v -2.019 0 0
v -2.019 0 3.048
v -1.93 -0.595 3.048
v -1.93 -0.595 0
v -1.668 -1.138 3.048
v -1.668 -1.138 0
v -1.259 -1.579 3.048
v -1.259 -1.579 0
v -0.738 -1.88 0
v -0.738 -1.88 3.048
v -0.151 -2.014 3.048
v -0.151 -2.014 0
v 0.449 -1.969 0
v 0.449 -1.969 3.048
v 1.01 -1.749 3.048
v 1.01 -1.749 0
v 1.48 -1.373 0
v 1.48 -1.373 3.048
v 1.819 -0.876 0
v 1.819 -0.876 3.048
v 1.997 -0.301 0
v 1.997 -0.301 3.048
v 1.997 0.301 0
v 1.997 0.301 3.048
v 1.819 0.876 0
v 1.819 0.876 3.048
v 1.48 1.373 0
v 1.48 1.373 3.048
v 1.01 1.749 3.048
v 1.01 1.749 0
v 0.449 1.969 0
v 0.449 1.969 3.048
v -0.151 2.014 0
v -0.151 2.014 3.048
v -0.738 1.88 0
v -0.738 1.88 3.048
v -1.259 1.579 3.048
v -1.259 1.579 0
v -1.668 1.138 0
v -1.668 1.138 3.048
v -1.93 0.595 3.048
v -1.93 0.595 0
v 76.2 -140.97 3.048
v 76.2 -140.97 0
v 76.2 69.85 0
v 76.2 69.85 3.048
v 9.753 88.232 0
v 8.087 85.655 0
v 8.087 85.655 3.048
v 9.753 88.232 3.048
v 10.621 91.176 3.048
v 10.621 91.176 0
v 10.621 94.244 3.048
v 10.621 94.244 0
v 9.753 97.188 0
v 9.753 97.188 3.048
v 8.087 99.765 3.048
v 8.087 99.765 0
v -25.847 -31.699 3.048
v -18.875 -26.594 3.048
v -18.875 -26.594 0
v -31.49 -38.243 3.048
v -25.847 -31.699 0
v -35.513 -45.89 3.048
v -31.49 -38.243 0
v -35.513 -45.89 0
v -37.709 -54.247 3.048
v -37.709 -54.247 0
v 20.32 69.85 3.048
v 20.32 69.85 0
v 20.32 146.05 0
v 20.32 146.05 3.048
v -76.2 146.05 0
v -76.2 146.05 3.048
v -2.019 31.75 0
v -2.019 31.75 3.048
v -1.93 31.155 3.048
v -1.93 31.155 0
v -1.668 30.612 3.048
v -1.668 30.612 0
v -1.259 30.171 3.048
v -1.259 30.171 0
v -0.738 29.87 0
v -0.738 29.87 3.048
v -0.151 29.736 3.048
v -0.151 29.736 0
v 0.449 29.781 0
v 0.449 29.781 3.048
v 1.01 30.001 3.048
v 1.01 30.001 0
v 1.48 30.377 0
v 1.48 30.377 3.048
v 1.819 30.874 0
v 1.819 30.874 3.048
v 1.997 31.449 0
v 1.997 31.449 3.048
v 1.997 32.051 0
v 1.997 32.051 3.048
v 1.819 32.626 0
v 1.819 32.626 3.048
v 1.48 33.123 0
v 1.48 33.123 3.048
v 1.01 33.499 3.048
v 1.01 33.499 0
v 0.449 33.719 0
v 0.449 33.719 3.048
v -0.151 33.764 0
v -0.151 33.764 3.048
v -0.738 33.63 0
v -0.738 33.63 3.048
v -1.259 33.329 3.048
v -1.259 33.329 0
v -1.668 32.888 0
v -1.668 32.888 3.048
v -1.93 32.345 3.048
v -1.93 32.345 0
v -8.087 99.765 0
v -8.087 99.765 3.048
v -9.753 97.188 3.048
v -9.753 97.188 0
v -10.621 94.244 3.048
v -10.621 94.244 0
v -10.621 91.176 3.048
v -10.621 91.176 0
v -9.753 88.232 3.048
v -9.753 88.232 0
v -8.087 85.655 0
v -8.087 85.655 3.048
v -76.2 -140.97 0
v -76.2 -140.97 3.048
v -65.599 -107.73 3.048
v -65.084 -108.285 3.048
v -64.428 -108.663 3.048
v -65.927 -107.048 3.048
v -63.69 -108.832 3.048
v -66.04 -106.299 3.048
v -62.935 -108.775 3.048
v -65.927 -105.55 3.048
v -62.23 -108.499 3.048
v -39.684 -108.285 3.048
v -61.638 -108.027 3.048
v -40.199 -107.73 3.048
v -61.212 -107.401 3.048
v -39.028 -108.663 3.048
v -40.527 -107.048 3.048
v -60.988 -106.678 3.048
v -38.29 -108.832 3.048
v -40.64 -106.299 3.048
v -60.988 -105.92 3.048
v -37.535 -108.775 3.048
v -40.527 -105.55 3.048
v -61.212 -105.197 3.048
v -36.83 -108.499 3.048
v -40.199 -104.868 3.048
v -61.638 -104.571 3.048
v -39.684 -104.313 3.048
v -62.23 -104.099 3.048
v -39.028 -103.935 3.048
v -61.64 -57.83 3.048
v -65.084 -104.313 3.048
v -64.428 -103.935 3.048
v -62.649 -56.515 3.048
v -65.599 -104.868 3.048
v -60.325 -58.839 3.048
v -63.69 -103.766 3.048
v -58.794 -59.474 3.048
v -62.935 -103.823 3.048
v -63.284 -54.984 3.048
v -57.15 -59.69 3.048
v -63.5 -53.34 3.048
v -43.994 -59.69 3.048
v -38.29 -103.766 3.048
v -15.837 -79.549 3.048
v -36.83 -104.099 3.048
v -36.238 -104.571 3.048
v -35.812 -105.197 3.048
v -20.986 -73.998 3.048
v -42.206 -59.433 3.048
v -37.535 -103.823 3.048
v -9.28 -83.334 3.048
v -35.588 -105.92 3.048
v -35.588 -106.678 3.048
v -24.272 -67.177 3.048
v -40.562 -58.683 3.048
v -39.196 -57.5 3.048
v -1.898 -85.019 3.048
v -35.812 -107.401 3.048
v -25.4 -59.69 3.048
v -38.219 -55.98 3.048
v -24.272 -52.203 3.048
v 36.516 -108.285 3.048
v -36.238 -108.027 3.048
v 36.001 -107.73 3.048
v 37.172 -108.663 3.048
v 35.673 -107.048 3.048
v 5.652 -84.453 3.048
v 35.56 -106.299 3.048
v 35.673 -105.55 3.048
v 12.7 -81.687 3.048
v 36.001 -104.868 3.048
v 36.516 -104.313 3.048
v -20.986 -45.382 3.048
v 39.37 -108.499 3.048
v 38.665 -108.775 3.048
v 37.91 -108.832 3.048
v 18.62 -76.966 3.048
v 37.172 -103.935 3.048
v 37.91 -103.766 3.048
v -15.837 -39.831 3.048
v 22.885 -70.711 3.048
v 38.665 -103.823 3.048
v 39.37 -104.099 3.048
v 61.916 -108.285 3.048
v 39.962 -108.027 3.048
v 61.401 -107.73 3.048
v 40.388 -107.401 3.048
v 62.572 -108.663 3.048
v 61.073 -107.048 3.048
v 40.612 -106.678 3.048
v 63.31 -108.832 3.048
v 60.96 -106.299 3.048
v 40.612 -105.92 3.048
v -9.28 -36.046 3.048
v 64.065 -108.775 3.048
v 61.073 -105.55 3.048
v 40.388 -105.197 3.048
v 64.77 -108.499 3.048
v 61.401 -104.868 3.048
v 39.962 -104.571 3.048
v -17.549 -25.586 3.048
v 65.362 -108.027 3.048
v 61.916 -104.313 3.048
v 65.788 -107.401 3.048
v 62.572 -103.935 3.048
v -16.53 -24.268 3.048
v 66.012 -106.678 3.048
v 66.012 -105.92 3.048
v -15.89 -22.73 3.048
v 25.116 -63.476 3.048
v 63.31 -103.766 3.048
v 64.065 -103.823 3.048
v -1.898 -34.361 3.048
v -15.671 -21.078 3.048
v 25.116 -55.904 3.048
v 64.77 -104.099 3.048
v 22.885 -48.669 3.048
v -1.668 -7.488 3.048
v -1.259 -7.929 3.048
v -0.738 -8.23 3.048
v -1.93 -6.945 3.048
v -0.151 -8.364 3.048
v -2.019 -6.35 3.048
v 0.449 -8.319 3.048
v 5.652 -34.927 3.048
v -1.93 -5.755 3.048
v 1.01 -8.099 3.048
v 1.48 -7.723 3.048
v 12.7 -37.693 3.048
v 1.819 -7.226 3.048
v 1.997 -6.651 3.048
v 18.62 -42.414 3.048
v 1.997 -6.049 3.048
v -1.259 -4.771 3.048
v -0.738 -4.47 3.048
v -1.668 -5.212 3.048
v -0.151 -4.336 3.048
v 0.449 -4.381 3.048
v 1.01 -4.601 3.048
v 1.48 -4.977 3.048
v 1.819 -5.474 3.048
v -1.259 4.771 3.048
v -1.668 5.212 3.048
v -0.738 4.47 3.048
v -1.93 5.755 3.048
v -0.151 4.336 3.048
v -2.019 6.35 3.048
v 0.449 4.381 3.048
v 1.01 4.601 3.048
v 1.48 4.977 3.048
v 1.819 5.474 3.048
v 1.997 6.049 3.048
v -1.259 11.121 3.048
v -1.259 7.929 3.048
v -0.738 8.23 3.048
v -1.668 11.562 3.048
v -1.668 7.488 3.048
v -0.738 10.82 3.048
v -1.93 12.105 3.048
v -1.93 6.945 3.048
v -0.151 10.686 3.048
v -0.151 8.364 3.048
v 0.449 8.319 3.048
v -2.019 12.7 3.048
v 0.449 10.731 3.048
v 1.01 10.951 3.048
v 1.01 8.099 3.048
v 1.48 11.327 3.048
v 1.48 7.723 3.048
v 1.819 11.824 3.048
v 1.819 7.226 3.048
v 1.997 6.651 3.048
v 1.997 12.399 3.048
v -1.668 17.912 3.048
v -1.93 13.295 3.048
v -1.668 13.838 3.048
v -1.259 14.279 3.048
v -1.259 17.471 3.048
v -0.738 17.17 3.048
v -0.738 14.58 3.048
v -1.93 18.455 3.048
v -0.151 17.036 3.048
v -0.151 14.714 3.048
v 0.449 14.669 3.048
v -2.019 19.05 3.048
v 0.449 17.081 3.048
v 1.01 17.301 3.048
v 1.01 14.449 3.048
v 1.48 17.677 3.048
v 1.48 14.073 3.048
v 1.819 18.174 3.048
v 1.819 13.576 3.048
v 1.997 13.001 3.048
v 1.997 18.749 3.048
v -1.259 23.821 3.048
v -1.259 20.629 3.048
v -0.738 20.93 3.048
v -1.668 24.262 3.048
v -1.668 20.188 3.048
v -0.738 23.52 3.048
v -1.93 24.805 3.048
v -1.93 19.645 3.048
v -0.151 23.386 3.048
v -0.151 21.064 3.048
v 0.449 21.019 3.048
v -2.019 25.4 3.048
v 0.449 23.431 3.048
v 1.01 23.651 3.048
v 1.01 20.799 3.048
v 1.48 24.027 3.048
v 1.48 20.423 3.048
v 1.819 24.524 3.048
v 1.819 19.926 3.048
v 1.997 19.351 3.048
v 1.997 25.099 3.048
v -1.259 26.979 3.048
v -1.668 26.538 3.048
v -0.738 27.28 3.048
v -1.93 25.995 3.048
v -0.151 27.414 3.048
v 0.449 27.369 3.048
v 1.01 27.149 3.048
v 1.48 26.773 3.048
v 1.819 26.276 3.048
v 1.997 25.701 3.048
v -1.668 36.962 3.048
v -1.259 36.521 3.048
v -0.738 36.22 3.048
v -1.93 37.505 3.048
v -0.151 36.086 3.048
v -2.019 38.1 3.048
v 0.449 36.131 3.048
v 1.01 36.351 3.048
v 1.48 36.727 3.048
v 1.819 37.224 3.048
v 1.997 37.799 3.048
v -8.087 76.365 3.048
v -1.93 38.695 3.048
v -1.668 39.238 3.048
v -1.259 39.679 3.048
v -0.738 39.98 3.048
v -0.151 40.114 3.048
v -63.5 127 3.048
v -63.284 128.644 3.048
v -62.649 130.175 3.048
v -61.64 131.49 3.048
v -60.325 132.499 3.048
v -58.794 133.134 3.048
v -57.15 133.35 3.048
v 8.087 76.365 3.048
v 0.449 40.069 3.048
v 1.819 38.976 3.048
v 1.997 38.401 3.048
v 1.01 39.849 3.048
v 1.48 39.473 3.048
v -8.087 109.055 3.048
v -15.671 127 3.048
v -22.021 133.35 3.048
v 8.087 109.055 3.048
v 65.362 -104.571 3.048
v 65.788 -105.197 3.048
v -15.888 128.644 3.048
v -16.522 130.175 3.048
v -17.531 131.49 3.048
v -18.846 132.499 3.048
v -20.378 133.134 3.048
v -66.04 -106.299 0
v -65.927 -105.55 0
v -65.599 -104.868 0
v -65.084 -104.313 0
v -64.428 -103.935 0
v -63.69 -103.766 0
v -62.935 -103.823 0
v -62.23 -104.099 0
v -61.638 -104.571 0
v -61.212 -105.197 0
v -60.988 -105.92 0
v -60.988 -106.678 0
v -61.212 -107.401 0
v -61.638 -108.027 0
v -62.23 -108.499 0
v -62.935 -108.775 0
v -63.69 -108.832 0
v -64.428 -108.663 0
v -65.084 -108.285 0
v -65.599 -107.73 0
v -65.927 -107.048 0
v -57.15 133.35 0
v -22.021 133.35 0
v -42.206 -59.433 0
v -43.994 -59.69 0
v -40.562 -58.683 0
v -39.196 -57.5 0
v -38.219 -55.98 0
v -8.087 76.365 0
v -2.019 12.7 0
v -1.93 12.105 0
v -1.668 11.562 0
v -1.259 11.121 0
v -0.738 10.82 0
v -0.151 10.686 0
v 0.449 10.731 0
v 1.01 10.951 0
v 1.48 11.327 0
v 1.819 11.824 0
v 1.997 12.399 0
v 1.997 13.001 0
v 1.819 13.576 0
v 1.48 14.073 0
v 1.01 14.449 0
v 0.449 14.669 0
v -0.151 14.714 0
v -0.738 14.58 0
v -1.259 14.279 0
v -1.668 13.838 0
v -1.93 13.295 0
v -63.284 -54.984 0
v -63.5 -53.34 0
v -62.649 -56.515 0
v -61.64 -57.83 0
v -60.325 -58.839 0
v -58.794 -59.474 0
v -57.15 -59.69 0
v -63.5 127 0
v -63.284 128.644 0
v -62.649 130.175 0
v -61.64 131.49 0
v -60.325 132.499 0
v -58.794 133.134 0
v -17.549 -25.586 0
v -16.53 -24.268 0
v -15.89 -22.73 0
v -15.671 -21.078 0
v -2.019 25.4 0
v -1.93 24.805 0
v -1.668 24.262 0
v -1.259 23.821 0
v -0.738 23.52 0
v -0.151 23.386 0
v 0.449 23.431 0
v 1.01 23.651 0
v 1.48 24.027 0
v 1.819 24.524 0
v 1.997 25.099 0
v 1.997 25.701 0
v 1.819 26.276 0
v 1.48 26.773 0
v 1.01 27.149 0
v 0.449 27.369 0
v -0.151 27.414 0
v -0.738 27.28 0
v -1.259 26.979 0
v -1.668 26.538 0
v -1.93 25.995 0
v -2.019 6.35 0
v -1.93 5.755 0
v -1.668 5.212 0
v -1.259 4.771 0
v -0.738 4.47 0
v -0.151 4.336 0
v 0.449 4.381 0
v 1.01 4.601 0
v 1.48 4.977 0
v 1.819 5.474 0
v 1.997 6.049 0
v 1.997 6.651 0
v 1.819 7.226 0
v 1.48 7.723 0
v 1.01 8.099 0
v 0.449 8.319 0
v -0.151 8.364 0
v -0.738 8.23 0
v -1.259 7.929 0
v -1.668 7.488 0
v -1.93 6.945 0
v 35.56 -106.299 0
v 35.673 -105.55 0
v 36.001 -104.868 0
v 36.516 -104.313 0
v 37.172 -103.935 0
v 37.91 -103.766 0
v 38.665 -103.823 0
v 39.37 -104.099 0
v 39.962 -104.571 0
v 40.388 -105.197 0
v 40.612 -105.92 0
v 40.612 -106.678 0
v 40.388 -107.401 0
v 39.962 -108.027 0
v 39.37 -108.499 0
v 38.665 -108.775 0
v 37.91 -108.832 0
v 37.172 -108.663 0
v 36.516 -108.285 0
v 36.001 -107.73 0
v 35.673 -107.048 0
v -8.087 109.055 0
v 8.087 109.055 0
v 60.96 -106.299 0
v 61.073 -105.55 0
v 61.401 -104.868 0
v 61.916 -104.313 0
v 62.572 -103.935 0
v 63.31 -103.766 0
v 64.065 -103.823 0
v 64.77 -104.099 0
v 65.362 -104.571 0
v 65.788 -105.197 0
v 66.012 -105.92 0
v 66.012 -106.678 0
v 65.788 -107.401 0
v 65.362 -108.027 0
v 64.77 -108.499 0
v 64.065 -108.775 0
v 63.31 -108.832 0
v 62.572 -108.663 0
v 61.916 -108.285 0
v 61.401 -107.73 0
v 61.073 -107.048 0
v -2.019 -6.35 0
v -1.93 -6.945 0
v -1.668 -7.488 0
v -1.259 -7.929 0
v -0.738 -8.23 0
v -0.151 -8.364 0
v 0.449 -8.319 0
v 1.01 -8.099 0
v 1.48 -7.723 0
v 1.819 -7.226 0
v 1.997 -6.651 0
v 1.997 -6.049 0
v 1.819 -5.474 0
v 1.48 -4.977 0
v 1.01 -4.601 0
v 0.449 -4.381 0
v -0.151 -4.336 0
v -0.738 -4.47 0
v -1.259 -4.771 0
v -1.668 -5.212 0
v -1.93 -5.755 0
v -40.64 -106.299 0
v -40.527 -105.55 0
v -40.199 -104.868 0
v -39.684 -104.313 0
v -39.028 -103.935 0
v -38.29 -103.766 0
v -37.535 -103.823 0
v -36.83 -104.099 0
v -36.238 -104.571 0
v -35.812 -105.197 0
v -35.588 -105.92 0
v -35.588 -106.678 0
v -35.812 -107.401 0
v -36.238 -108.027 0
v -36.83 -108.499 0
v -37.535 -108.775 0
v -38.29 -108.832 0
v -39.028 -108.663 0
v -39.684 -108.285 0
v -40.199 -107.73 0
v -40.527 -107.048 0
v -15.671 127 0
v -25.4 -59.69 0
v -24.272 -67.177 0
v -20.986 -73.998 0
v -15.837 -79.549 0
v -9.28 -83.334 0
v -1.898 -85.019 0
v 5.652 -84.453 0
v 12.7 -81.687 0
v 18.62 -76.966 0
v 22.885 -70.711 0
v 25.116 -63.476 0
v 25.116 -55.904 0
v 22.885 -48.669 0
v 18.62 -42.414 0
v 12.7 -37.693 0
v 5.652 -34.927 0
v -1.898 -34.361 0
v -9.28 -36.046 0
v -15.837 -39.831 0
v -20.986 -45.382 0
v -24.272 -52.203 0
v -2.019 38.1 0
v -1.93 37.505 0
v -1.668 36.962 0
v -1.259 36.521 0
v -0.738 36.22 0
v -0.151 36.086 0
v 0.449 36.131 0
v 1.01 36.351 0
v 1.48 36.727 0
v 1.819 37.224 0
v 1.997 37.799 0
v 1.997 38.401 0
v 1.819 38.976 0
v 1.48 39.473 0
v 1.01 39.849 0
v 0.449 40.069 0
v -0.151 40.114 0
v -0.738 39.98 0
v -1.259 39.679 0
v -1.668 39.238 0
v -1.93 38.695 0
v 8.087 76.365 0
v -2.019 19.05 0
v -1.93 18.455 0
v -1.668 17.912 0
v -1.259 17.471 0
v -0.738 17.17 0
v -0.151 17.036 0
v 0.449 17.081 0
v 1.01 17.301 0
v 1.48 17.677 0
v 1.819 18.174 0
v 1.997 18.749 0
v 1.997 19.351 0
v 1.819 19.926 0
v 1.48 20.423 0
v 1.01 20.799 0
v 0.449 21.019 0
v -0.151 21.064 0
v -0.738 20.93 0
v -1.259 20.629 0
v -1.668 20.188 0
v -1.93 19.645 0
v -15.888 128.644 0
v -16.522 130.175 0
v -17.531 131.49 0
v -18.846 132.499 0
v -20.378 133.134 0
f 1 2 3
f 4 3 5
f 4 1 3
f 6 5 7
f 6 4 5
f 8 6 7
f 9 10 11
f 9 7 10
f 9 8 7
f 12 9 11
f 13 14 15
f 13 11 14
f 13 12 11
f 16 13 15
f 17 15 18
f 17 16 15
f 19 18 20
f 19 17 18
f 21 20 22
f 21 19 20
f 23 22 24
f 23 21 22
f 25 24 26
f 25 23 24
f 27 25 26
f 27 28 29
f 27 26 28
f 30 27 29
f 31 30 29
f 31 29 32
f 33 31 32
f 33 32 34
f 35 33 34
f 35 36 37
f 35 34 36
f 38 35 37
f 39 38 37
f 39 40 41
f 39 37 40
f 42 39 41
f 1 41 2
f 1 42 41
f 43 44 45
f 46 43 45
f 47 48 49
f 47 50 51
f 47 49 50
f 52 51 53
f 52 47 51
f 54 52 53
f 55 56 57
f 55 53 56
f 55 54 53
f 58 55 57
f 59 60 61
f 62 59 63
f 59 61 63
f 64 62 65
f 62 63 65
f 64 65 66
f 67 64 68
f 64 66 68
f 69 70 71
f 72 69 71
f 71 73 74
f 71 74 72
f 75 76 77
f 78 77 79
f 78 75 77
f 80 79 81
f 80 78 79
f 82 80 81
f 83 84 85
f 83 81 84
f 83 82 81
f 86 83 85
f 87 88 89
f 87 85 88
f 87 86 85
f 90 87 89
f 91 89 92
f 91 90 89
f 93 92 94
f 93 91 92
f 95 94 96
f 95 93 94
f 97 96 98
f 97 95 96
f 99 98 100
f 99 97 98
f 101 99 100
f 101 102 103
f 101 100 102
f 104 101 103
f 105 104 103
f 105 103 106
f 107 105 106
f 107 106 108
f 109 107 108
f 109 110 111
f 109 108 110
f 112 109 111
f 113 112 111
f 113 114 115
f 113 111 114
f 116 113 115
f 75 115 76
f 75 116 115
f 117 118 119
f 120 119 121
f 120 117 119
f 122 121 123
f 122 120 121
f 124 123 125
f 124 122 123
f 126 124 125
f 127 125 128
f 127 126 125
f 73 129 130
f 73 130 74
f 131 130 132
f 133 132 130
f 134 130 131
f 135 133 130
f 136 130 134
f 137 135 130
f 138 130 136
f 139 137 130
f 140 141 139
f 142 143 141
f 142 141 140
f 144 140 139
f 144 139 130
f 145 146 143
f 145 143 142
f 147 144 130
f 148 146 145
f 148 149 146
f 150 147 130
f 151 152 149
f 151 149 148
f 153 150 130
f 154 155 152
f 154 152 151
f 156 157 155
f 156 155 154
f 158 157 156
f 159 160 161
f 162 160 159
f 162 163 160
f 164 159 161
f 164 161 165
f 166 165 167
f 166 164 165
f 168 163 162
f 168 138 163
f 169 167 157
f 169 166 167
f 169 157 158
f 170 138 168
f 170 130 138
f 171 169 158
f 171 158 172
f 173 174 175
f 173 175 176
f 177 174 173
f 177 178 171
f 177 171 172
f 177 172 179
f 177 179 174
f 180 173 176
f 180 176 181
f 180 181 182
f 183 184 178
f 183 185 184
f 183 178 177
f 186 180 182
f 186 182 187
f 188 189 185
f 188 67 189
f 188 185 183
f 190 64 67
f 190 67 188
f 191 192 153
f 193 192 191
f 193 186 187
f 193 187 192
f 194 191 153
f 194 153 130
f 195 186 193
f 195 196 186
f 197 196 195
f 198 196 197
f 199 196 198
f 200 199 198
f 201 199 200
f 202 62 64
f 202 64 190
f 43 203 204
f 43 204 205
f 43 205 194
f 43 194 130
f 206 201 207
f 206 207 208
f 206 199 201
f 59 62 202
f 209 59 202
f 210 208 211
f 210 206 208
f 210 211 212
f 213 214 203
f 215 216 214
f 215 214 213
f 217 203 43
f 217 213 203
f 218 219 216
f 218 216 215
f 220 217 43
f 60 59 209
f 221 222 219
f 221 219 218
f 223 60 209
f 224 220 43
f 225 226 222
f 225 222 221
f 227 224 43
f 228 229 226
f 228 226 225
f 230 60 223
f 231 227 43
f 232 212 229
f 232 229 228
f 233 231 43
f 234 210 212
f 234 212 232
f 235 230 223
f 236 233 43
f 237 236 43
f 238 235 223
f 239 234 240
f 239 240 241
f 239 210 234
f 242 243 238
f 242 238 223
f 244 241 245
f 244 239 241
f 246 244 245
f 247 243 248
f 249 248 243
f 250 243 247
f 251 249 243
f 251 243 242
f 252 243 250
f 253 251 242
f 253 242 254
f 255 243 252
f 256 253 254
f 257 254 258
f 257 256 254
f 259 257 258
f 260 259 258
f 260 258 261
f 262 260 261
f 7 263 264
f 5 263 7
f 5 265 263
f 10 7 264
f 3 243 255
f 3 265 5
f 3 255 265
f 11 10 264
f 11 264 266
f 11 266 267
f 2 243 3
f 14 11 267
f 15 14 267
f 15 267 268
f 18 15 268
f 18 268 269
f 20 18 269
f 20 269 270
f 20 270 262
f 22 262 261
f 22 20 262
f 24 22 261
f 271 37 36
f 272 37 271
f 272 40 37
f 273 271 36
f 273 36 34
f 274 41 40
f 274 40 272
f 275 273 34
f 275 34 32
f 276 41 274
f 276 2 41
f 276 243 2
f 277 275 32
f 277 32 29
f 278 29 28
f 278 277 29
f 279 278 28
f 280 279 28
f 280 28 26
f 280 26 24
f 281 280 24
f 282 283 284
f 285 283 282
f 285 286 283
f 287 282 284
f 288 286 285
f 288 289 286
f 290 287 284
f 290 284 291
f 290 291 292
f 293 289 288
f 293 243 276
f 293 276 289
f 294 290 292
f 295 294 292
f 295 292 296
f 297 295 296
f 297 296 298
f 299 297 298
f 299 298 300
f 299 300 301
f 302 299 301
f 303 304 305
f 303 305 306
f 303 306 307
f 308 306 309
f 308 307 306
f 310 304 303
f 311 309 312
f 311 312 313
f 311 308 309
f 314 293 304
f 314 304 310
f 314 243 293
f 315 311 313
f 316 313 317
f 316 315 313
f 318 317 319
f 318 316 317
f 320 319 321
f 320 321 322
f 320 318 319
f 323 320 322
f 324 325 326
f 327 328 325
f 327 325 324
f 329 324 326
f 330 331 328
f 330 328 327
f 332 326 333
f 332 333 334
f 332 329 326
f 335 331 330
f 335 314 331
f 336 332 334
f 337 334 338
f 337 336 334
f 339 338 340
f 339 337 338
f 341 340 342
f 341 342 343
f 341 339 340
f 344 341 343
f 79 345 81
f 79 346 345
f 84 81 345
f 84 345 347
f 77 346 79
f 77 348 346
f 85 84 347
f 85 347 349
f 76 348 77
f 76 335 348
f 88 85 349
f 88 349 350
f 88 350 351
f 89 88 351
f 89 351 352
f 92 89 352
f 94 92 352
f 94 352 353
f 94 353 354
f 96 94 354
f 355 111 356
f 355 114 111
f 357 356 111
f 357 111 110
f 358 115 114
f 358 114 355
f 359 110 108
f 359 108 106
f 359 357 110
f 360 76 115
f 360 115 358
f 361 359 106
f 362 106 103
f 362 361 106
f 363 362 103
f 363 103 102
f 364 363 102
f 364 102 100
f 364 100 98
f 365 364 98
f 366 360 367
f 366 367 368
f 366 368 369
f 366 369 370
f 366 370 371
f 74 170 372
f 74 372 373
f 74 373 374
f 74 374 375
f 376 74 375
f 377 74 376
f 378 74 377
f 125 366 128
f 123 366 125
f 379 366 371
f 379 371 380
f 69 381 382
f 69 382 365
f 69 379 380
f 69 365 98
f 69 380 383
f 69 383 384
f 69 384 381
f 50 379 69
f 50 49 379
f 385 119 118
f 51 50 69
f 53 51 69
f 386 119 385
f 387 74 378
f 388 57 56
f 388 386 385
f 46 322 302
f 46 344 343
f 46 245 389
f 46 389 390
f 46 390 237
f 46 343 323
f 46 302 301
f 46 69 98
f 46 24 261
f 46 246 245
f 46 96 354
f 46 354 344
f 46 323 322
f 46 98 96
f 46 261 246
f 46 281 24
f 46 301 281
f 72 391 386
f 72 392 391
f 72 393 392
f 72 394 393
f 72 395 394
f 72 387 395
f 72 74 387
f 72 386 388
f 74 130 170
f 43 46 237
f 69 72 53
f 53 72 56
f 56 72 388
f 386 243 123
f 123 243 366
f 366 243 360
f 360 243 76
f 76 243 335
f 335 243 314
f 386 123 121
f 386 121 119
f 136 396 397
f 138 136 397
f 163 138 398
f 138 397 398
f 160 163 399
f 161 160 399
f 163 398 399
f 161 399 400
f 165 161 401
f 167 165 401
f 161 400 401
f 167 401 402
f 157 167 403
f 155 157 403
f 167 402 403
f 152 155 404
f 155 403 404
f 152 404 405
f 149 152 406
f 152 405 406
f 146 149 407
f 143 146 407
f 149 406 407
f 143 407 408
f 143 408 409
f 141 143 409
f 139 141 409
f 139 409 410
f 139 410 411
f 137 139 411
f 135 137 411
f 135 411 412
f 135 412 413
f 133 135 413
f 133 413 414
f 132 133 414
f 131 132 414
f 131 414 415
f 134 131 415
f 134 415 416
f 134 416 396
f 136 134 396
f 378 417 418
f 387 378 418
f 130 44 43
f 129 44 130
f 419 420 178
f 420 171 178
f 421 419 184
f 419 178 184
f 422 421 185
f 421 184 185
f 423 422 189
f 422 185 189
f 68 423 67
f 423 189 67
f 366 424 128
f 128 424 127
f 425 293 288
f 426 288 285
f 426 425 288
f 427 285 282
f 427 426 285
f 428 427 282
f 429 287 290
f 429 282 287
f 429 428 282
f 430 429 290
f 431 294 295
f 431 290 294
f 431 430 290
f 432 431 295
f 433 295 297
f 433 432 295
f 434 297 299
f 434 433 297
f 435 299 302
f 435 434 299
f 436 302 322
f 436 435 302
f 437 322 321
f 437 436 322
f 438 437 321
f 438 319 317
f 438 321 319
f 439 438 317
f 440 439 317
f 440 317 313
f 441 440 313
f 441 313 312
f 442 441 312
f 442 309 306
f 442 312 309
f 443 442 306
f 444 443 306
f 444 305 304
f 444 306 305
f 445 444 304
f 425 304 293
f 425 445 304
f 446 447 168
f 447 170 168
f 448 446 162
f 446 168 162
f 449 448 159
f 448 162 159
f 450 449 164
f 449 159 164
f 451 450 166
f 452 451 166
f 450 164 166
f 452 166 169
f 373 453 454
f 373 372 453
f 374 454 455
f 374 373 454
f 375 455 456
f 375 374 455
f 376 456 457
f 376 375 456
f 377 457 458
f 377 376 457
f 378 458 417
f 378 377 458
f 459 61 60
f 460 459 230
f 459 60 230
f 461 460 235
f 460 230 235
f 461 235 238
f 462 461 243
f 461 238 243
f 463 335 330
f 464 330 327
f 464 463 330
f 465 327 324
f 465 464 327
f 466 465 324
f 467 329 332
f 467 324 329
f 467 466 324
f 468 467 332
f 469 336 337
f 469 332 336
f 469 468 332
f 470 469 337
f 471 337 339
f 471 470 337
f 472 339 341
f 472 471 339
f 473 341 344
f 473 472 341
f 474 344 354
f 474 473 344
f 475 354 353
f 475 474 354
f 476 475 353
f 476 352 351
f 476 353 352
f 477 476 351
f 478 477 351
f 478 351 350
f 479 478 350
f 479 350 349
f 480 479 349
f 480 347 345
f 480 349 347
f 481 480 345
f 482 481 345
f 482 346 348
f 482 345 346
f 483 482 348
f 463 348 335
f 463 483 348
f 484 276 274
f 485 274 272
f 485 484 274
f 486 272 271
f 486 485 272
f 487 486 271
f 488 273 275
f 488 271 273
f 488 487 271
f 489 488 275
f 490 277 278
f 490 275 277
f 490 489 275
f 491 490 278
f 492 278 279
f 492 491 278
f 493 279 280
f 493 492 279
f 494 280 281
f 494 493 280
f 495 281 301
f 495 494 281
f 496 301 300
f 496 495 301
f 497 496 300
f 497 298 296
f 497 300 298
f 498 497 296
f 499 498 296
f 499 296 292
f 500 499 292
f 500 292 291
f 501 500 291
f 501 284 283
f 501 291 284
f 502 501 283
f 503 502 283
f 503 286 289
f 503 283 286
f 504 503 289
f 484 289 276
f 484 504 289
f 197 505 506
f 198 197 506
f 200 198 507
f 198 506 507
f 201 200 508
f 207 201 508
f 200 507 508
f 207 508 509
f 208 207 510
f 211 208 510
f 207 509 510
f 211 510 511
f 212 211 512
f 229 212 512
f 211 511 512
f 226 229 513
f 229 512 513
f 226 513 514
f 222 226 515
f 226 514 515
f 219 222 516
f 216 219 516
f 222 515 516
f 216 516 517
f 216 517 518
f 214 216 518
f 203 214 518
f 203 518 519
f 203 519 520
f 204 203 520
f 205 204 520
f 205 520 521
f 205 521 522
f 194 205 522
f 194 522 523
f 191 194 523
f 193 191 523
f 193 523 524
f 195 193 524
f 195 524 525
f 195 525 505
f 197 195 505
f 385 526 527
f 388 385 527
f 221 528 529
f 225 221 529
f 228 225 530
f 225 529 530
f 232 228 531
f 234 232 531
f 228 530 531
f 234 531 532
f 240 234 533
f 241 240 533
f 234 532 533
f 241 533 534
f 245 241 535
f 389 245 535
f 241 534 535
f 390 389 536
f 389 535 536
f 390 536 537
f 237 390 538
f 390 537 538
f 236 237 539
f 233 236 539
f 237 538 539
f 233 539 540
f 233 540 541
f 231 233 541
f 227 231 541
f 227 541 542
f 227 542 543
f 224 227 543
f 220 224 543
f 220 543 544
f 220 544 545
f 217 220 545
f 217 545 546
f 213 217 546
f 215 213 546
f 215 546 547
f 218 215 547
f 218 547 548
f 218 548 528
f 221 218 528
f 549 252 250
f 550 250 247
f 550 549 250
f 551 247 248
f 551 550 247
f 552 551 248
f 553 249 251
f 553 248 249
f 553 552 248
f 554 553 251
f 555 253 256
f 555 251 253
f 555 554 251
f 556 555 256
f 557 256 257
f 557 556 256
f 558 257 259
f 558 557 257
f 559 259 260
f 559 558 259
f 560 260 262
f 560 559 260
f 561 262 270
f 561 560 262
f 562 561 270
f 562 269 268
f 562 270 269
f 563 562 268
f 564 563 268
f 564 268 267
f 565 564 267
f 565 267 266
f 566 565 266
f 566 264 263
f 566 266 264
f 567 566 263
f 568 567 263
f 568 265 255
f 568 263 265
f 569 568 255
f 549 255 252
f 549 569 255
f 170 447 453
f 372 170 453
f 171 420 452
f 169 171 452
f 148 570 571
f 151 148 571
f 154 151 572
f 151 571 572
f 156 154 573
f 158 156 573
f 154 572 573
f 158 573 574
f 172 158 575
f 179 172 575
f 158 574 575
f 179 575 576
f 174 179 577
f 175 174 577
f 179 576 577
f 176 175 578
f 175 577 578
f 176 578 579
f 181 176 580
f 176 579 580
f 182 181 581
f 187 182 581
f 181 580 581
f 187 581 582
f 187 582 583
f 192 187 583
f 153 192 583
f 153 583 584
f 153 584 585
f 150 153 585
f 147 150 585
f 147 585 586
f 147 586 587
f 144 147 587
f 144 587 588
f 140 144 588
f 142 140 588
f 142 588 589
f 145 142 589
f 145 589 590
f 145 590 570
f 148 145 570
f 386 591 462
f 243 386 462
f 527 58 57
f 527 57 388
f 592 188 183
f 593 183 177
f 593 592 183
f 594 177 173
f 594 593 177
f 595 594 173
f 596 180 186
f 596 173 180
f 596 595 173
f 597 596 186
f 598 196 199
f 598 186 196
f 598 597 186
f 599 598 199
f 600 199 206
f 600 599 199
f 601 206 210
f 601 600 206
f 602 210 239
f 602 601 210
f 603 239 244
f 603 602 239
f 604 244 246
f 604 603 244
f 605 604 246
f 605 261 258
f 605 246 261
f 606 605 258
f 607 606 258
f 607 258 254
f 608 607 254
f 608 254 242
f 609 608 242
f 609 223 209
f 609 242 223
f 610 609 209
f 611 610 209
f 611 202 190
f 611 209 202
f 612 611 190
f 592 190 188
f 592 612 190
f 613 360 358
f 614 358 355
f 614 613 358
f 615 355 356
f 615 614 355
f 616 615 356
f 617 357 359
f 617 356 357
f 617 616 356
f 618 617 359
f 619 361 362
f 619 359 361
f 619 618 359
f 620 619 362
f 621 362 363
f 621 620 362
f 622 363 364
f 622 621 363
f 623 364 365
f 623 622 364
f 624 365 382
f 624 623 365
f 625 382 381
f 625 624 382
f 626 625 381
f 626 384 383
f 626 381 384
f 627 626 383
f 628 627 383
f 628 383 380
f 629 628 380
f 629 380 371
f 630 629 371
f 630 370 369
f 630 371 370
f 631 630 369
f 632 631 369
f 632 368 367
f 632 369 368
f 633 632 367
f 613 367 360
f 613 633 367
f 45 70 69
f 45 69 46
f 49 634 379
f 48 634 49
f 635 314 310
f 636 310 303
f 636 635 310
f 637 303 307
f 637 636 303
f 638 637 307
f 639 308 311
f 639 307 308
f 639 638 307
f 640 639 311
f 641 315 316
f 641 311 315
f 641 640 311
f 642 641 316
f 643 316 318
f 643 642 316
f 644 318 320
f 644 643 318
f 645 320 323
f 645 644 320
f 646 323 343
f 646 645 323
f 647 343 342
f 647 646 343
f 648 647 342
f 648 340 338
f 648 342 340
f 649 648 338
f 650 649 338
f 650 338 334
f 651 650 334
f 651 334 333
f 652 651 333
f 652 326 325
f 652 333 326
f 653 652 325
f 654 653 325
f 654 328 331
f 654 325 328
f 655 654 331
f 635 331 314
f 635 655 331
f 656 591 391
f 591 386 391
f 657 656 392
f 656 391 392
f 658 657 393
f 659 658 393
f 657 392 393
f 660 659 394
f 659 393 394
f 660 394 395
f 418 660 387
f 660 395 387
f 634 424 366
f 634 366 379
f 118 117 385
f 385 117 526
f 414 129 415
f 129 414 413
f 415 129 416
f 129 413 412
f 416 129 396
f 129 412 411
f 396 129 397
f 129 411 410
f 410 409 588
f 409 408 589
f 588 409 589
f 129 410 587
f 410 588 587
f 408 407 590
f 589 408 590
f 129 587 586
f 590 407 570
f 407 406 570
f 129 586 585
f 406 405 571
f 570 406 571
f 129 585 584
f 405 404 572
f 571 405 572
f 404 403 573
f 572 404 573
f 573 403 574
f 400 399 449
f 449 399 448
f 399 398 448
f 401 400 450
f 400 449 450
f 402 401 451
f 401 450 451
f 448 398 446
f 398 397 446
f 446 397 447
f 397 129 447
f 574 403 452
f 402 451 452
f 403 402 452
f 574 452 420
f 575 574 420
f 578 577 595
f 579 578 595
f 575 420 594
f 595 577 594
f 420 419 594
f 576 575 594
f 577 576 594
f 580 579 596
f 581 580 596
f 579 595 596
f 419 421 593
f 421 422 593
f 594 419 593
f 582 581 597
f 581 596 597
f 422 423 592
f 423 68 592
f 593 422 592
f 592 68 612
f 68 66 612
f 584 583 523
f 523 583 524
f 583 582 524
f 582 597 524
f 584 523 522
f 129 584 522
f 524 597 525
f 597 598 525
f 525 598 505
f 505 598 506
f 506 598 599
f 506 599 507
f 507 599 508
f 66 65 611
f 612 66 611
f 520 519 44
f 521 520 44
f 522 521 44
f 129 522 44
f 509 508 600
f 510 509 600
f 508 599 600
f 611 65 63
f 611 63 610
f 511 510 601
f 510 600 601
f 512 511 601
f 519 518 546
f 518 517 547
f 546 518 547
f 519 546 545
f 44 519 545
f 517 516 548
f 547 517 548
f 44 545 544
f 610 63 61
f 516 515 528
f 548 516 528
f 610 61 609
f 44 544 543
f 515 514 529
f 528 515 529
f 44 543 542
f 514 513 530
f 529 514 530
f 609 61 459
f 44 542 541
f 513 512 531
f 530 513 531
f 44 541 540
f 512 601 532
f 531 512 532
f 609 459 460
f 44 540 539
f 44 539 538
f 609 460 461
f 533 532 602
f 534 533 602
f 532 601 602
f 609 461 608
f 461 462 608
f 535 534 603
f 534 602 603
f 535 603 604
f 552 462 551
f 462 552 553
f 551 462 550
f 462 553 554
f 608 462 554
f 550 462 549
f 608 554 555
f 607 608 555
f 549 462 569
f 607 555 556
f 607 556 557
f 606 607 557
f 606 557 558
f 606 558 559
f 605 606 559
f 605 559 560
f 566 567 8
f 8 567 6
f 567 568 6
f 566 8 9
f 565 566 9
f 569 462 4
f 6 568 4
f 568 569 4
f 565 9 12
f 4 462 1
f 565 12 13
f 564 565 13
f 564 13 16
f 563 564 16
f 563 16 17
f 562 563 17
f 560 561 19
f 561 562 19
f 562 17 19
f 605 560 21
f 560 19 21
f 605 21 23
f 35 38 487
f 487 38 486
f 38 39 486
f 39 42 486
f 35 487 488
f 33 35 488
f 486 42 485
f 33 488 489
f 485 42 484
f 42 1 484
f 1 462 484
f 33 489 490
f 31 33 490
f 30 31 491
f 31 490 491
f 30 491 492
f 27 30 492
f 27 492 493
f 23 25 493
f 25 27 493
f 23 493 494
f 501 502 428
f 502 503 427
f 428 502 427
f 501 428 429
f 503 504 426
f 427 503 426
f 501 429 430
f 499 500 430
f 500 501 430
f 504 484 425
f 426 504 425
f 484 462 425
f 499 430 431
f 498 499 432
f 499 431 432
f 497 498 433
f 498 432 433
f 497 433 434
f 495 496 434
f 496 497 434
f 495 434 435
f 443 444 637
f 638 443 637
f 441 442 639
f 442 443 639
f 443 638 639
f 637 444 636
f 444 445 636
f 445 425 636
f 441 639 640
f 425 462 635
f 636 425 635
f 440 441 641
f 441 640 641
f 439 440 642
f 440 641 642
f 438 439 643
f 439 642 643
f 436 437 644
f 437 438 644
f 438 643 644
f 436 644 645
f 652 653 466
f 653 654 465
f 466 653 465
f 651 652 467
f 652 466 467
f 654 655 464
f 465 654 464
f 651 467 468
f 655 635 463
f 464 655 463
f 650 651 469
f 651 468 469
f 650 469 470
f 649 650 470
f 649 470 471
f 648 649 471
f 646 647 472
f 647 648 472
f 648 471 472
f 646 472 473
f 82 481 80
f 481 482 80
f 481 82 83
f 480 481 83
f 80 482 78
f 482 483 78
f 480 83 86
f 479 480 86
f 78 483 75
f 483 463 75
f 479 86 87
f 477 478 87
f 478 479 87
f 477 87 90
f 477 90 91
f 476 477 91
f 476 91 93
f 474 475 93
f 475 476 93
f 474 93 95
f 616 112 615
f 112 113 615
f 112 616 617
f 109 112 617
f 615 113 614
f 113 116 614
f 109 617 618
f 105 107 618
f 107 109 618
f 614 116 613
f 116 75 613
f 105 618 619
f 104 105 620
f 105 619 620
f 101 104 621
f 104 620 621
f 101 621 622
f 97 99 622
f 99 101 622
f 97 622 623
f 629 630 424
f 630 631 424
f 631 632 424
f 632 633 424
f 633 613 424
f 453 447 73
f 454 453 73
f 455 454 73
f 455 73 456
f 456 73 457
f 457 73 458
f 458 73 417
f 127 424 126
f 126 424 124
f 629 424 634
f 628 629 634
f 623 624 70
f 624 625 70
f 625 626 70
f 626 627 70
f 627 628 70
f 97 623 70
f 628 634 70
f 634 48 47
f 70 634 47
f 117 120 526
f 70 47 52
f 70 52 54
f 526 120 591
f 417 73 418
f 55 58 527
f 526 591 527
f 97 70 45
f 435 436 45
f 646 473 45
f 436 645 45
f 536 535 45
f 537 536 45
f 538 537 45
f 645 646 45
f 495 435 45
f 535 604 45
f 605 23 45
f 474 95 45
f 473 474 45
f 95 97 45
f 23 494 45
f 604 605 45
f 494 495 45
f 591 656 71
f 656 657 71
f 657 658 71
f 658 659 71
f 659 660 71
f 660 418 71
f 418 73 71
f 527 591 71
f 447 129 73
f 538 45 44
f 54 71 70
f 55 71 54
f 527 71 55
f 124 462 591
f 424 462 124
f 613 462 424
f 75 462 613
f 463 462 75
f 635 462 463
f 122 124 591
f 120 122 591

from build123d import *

# Parameters (mm, degrees)
SKETCH1_W           = 152.4
SKETCH1_H           = 292.1
BOSS_EXTRUDE1_DEPTH = 3.048
SKETCH2_R           = 25.4
SKETCH2_R_2         = 10.7315
SKETCH2_R_3         = 2.0193
SKETCH2_W           = 16.173788568
SKETCH2_H           = 32.6898
CUT_EXTRUDE1_DEPTH  = 165.761442103
SKETCH4_W           = 55.88
SKETCH4_H           = 76.2
CUT_EXTRUDE2_DEPTH  = 165.761442103
SKETCH5_R           = 2.54
CUT_EXTRUDE3_DEPTH  = 165.761442103
SKETCH6_W           = 152.4
SKETCH6_H           = 5.08
CUT_EXTRUDE4_DEPTH  = 165.761442103
CUT_EXTRUDE5_DEPTH  = 6.35
FILLET1_R           = 6.35


with BuildPart() as part:
    # Sketch1 → Boss-Extrude1 (new body)
    with BuildSketch(Plane.XY):
        Rectangle(SKETCH1_W, SKETCH1_H)
    extrude(amount=BOSS_EXTRUDE1_DEPTH)

    # Sketch2 → Cut-Extrude1 (cut, through all)
    with BuildSketch(Plane.XY):
        with Locations(Location((0, -59.69, 0), (0, 0, 180))):
            Circle(SKETCH2_R)
        with Locations((0, 92.71)):
            Circle(SKETCH2_R_2)
        with Locations(Location((0, 38.1, 0), (0, 0, 180))):
            Circle(SKETCH2_R_3)
        with Locations(Location((0, 31.75, 0), (0, 0, 180))):
            Circle(SKETCH2_R_3)
        with Locations(Location((0, 25.4, 0), (0, 0, 180))):
            Circle(SKETCH2_R_3)
        with Locations(Location((0, 19.05, 0), (0, 0, 180))):
            Circle(SKETCH2_R_3)
        with Locations(Location((0, 12.7, 0), (0, 0, 180))):
            Circle(SKETCH2_R_3)
        with Locations(Location((0, 6.35, 0), (0, 0, 180))):
            Circle(SKETCH2_R_3)
        with Locations(Location((0, 0, 0), (0, 0, 180))):
            Circle(SKETCH2_R_3)
        with Locations(Location((0, -6.35, 0), (0, 0, 180))):
            Circle(SKETCH2_R_3)
        with Locations((0, 92.71)):
            Rectangle(SKETCH2_W, SKETCH2_H)
    extrude(amount=CUT_EXTRUDE1_DEPTH, mode=Mode.SUBTRACT)

    # Sketch4 → Cut-Extrude2 (cut, through all)
    with BuildSketch(Plane.XY):
        with Locations((48.26, 107.95)):
            Rectangle(SKETCH4_W, SKETCH4_H)
    extrude(amount=CUT_EXTRUDE2_DEPTH, mode=Mode.SUBTRACT)

    # Sketch5 → Cut-Extrude3 (cut, through all)
    with BuildSketch(Plane(origin=(0, 0, 0), x_dir=(-1, 0, 0), z_dir=(0, 0, -1))):
        with Locations((-38.1, -106.299)):
            Circle(SKETCH5_R)
        with Locations((-63.5, -106.299)):
            Circle(SKETCH5_R)
        with Locations((63.5, -106.299)):
            Circle(SKETCH5_R)
        with Locations((38.1, -106.299)):
            Circle(SKETCH5_R)
    extrude(amount=-CUT_EXTRUDE3_DEPTH, mode=Mode.SUBTRACT)

    # Sketch6 → Cut-Extrude4 (cut, through all)
    with BuildSketch(Plane(origin=(0, 0, 0), x_dir=(-1, 0, 0), z_dir=(0, 0, -1))):
        with Locations((0, -143.51)):
            Rectangle(SKETCH6_W, SKETCH6_H)
    extrude(amount=-CUT_EXTRUDE4_DEPTH, mode=Mode.SUBTRACT)

    # Sketch7 → Cut-Extrude5 (cut)
    with BuildSketch(Plane(origin=(0, 0, 0), x_dir=(-1, 0, 0), z_dir=(0, 0, -1))):
        with BuildLine():
            Line((63.5, 133.35), (15.671209909, 133.35))
            Line((15.671209909, 133.35), (15.671209909, -24.962155552))
            ThreePointArc((15.671209909, -24.962155552), (32.005336255, -39.019527068), (38.1, -59.69))
            Line((38.1, -59.69), (63.5, -59.69))
            Line((63.5, -59.69), (63.5, 133.35))
        make_face()
    extrude(amount=-CUT_EXTRUDE5_DEPTH, mode=Mode.SUBTRACT)

    # Fillet1
    fillet1_edges = [part.edges().sort_by_distance(p)[0] for p in [
        (-38.1, -59.69, 1.524),
        (-15.671209909, -24.962155552, 1.524),
        (-15.671209909, 133.35, 1.524),
        (-63.5, 133.35, 1.524),
        (-63.5, -59.69, 1.524),
    ]]
    fillet(fillet1_edges, radius=FILLET1_R)


solid = part.part
